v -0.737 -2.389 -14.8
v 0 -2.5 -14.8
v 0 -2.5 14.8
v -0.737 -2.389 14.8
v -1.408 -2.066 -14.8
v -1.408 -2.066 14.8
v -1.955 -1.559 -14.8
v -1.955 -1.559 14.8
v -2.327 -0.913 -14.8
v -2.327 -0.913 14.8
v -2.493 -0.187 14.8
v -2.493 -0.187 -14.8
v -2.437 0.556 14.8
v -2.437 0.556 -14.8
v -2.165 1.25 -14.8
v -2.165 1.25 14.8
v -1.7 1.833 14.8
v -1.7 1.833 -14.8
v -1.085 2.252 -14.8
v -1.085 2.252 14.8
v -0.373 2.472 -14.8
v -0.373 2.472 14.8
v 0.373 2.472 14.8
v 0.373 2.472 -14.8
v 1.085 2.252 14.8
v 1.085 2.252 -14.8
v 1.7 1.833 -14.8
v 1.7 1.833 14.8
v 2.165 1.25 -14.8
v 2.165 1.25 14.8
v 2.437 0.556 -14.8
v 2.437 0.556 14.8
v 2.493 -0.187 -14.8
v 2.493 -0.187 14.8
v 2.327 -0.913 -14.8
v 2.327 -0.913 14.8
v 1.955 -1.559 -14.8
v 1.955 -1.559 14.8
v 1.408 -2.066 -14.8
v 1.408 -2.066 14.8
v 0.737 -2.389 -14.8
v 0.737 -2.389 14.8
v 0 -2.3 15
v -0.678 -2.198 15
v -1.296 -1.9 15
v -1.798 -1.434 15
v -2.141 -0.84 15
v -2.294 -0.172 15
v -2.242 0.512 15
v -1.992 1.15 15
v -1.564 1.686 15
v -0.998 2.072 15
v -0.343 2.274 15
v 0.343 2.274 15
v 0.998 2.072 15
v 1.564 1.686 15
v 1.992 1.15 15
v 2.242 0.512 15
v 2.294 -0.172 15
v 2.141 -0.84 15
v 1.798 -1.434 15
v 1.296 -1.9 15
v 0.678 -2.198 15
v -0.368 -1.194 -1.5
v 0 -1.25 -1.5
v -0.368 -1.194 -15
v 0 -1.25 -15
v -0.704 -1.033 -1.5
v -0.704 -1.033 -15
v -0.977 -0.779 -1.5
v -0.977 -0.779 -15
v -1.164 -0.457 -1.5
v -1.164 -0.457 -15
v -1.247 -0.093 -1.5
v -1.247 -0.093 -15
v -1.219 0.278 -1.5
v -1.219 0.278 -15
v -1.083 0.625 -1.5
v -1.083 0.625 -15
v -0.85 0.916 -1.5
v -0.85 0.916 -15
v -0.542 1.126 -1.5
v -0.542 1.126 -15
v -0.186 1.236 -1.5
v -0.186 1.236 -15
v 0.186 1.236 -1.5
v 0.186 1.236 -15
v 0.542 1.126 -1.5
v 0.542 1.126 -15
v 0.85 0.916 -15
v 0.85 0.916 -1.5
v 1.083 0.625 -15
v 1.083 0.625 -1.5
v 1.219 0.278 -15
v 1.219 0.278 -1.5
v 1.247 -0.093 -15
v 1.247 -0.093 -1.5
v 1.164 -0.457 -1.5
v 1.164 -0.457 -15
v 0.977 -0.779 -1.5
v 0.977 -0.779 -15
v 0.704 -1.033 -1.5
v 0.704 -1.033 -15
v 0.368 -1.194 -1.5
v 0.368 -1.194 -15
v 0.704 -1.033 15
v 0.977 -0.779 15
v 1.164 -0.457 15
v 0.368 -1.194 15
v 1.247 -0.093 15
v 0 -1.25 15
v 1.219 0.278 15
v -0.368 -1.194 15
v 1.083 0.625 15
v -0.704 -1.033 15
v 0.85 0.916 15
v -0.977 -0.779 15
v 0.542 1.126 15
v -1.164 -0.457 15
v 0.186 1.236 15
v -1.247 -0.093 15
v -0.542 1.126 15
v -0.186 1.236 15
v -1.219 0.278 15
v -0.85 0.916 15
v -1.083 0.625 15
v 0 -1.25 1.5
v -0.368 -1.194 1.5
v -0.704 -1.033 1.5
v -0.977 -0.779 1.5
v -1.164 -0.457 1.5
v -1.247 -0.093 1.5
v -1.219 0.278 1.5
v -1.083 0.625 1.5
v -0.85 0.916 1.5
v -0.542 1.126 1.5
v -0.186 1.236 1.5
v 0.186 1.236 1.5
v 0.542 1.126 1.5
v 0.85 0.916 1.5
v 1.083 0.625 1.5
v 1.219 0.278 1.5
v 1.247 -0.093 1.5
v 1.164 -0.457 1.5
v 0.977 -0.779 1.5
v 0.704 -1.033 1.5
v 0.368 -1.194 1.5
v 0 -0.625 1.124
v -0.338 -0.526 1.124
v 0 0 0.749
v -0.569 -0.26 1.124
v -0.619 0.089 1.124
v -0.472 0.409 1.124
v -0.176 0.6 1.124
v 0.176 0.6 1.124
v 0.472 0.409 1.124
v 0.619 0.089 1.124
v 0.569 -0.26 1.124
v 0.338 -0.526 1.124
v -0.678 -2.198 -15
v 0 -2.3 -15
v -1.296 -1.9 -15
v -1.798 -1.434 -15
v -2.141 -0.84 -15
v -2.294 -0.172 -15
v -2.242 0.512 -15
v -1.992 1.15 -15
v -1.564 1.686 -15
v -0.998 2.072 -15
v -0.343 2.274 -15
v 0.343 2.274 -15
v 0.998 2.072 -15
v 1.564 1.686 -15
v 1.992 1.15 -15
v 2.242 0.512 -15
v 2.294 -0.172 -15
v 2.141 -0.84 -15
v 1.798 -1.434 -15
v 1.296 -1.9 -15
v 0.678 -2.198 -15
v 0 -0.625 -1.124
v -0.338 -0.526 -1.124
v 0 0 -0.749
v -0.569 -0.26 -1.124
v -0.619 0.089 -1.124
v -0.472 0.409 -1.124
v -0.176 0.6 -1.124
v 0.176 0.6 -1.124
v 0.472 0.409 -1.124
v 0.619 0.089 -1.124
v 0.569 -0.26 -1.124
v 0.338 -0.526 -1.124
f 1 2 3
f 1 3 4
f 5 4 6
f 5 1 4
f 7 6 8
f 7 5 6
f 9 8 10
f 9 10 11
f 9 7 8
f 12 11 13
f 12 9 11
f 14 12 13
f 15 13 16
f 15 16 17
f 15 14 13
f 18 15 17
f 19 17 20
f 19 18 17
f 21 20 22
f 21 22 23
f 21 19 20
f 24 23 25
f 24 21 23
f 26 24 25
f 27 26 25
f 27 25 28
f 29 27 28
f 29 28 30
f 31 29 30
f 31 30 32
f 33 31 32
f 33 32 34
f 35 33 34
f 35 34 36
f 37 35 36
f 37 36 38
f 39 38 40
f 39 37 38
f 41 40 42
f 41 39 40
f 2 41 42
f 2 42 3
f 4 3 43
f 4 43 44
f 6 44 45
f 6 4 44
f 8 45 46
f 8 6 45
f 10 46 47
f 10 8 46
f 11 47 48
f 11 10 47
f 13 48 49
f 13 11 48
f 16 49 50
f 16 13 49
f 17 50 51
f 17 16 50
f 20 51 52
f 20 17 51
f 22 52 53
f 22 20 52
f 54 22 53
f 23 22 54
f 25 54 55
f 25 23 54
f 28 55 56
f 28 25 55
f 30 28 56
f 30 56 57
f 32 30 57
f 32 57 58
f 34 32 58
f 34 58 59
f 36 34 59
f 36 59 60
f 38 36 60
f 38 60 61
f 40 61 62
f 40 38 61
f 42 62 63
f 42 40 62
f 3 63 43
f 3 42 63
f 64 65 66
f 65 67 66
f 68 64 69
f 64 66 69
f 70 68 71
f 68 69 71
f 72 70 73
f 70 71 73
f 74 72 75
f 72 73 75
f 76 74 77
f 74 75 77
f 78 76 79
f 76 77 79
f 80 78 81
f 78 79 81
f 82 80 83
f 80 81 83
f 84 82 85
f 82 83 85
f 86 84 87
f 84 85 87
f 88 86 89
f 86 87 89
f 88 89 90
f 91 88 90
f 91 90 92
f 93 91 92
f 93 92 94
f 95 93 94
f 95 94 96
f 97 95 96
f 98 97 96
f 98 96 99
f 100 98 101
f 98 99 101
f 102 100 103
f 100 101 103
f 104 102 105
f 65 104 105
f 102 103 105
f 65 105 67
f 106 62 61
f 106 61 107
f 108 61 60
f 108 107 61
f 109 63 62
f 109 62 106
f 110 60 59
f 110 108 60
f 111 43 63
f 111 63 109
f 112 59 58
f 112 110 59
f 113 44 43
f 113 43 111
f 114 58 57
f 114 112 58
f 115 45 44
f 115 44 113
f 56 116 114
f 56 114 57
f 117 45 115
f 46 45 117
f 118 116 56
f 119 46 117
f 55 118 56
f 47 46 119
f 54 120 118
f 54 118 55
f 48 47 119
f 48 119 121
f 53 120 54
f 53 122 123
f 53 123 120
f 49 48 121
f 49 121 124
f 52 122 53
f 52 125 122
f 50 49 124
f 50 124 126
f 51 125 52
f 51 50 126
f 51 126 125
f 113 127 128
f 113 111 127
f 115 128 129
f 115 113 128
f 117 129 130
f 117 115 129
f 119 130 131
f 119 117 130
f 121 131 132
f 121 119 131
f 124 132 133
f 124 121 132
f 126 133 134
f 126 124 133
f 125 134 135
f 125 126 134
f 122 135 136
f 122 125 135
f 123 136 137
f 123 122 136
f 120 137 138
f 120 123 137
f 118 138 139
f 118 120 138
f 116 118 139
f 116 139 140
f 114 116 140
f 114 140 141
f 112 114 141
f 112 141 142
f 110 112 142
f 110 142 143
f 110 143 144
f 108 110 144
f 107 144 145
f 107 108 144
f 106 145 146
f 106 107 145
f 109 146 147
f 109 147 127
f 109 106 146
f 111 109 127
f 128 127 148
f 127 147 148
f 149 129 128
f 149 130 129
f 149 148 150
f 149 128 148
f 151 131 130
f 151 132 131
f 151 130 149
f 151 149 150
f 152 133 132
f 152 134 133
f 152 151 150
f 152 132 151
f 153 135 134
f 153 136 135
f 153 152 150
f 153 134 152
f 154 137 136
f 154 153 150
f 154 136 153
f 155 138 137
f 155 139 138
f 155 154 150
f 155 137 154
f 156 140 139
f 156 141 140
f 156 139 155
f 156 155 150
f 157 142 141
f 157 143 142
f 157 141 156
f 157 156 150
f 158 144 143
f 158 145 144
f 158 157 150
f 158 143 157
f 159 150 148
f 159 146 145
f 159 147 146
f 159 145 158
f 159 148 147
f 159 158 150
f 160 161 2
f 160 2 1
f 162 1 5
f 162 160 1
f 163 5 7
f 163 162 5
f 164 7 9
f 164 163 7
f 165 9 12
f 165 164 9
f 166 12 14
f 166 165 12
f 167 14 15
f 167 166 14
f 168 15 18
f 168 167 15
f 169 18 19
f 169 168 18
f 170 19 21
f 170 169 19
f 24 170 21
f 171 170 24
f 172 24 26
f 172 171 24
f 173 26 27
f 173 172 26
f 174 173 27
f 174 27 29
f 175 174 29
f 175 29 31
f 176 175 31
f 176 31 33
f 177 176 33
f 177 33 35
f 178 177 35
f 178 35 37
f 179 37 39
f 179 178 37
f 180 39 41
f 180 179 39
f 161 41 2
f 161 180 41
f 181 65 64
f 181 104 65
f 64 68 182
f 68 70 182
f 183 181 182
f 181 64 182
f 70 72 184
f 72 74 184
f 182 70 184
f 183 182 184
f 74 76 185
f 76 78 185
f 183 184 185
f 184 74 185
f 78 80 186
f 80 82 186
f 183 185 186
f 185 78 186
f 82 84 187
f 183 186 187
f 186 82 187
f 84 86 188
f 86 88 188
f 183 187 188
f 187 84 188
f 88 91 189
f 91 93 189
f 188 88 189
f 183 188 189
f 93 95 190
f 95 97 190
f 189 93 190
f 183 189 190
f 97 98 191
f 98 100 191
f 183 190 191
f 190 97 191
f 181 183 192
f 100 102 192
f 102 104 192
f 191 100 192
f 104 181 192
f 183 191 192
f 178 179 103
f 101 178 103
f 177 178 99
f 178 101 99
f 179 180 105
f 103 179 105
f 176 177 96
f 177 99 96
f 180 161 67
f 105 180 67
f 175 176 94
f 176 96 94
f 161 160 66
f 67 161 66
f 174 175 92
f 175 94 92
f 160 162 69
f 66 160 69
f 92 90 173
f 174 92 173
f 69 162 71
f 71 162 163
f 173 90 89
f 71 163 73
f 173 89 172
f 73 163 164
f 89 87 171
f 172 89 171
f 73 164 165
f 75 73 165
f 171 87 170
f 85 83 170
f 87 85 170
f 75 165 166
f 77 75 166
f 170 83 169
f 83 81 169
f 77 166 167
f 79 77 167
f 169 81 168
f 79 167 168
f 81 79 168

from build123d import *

# Parameters (mm, degrees)
SKETCH_1_W     = 30
SKETCH_1_H     = 2.5
CHAMFER_1_SIZE = 0.2


with BuildPart() as part:
    # 草图1 → 旋转1 (revolve)
    with BuildSketch(Plane(origin=(0, 0, 0), x_dir=(0, 0, -1), z_dir=(1, 0, 0)), mode=Mode.PRIVATE) as revolve_1_sk:
        with Locations((0, 1.25)):
            Rectangle(SKETCH_1_W, SKETCH_1_H)
    revolve(revolve_1_sk.sketch.rotate(Axis((0, 0, 15), (0, 0, -1)), 180), axis=Axis((0, 0, 15), (0, 0, -1)))

    # 草图3 → Hole Wizard 1 (revolve, cut)
    with BuildSketch(Plane(origin=(0, 0, 15), x_dir=(0, -1, 0), z_dir=(1, 0, 0))):
        Polygon((0, 0), (0, 14.251075774), (1.25, 13.5), (1.25, 0), align=None)
    hole_wizard_1 = revolve(axis=Axis((0, 0, 21.35), (0, 0, -1)), mode=Mode.SUBTRACT)

    # 镜向1: Hole Wizard 1 across plane
    add(hole_wizard_1.mirror(Plane.XY), mode=Mode.SUBTRACT)

    # 倒角1
    chamfer_1_edges = [part.edges().sort_by_distance(p)[0] for p in [
        (0, 2.5, -15),
        (0, 2.5, 15),
    ]]
    chamfer(chamfer_1_edges, length=CHAMFER_1_SIZE)


solid = part.part
